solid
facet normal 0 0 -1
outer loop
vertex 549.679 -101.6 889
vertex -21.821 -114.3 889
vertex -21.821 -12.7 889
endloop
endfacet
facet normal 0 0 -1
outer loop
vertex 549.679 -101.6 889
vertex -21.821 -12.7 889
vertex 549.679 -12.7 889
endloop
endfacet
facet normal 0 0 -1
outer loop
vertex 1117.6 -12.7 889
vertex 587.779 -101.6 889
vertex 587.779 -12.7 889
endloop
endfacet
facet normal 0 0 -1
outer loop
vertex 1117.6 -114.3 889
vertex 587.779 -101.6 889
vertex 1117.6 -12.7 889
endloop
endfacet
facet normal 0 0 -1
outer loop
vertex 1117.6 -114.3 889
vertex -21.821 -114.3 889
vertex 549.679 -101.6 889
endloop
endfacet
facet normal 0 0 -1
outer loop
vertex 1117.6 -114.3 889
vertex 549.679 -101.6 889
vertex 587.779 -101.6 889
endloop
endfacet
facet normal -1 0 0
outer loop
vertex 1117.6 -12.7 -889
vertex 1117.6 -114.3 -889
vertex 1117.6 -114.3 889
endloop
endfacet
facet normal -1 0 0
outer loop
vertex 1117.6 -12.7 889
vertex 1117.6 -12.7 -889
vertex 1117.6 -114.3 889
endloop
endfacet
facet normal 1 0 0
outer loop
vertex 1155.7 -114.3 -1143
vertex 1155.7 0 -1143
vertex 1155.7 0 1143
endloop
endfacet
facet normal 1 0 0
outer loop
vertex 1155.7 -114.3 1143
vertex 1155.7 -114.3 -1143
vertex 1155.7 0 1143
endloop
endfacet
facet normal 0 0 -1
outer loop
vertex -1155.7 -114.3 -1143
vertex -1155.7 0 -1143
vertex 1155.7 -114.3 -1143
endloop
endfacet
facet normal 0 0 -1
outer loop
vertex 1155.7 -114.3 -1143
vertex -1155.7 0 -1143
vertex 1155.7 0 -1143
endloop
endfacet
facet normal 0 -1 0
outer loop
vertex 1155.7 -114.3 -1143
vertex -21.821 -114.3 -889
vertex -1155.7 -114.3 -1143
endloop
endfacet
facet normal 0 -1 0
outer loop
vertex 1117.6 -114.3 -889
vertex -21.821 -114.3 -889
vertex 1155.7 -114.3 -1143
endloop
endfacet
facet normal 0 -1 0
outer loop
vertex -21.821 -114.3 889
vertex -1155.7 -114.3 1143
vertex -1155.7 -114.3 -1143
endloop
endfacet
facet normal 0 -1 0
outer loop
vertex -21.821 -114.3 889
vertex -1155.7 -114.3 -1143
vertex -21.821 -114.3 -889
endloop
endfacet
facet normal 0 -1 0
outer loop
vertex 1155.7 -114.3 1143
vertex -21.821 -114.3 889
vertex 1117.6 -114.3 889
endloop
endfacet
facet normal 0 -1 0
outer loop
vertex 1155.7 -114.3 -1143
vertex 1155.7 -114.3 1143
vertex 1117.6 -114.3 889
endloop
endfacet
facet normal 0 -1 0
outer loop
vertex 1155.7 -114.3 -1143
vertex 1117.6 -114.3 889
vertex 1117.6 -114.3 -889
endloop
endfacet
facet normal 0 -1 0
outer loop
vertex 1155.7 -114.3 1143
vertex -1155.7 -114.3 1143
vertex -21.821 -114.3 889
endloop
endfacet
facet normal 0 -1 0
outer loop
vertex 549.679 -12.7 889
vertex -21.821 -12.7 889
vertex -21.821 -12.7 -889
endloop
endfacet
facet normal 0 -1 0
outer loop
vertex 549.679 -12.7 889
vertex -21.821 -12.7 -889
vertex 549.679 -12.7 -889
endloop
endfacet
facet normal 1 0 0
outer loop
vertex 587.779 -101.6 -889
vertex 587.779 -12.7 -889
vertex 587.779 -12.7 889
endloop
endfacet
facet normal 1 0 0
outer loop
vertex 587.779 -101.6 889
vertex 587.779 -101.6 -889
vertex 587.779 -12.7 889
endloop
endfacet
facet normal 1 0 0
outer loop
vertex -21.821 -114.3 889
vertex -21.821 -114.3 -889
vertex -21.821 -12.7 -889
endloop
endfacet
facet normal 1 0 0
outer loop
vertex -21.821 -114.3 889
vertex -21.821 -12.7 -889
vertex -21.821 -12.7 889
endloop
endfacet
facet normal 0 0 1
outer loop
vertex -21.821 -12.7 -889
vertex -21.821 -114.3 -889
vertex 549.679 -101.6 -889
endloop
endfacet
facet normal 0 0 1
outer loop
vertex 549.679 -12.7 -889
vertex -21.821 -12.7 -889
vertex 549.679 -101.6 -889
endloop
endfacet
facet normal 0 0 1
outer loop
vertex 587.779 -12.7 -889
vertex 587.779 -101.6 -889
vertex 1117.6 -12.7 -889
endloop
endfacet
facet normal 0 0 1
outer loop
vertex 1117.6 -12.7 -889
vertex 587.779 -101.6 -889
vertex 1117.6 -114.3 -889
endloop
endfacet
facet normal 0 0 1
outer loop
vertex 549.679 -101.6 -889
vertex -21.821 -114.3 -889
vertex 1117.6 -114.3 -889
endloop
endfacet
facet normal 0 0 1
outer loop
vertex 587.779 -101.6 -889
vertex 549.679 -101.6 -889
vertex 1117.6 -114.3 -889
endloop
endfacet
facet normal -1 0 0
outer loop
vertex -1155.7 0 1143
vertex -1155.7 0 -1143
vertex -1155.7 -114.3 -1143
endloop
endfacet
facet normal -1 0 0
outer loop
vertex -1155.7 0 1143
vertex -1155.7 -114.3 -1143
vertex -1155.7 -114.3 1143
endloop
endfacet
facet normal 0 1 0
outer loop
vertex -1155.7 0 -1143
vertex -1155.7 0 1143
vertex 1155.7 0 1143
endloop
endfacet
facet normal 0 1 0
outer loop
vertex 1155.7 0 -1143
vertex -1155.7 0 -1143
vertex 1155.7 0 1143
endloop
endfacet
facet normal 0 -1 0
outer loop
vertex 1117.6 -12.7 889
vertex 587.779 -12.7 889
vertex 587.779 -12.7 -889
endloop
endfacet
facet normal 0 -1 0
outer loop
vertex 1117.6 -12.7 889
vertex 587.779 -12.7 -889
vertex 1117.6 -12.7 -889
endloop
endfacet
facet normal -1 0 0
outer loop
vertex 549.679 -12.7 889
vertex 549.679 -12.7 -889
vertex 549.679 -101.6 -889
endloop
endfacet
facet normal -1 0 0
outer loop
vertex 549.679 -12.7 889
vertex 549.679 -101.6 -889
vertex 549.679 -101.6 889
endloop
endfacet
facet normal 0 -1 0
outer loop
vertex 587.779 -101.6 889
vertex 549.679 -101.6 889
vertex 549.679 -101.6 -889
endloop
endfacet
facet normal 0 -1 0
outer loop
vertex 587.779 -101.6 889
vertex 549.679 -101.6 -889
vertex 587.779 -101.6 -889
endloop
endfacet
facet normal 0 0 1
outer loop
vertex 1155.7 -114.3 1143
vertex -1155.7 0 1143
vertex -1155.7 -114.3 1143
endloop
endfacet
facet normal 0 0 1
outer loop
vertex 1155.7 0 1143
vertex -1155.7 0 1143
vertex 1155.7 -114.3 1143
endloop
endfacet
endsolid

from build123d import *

# Parameters (mm, degrees)
F0_W     = 2311.4
F0_H     = 2286
F1_DEPTH = 114.3
F2_W     = 1139.421445
F2_H     = 1778
F3_DEPTH = 101.6
F4_W     = 38.1
F4_H     = 1778
F5_DEPTH = 88.9


with BuildPart() as f1:
    # F0 (on Front) → F1 (new body)
    with BuildSketch(Plane.XZ):
        Rectangle(F0_W, F0_H)
    extrude(amount=F1_DEPTH)

    # F2 (on face) → F3 (cut)
    with BuildSketch(Plane.XZ.offset(114.3)):
        with Locations((547.889277, 0)):
            Rectangle(F2_W, F2_H)
    extrude(amount=-F3_DEPTH, mode=Mode.SUBTRACT)

    # F4 (on face) → F5 (join)
    with BuildSketch(Plane.XZ.offset(12.7)):
        with Locations((568.728555, 0)):
            Rectangle(F4_W, F4_H)
    extrude(amount=F5_DEPTH)


solid = f1.part
